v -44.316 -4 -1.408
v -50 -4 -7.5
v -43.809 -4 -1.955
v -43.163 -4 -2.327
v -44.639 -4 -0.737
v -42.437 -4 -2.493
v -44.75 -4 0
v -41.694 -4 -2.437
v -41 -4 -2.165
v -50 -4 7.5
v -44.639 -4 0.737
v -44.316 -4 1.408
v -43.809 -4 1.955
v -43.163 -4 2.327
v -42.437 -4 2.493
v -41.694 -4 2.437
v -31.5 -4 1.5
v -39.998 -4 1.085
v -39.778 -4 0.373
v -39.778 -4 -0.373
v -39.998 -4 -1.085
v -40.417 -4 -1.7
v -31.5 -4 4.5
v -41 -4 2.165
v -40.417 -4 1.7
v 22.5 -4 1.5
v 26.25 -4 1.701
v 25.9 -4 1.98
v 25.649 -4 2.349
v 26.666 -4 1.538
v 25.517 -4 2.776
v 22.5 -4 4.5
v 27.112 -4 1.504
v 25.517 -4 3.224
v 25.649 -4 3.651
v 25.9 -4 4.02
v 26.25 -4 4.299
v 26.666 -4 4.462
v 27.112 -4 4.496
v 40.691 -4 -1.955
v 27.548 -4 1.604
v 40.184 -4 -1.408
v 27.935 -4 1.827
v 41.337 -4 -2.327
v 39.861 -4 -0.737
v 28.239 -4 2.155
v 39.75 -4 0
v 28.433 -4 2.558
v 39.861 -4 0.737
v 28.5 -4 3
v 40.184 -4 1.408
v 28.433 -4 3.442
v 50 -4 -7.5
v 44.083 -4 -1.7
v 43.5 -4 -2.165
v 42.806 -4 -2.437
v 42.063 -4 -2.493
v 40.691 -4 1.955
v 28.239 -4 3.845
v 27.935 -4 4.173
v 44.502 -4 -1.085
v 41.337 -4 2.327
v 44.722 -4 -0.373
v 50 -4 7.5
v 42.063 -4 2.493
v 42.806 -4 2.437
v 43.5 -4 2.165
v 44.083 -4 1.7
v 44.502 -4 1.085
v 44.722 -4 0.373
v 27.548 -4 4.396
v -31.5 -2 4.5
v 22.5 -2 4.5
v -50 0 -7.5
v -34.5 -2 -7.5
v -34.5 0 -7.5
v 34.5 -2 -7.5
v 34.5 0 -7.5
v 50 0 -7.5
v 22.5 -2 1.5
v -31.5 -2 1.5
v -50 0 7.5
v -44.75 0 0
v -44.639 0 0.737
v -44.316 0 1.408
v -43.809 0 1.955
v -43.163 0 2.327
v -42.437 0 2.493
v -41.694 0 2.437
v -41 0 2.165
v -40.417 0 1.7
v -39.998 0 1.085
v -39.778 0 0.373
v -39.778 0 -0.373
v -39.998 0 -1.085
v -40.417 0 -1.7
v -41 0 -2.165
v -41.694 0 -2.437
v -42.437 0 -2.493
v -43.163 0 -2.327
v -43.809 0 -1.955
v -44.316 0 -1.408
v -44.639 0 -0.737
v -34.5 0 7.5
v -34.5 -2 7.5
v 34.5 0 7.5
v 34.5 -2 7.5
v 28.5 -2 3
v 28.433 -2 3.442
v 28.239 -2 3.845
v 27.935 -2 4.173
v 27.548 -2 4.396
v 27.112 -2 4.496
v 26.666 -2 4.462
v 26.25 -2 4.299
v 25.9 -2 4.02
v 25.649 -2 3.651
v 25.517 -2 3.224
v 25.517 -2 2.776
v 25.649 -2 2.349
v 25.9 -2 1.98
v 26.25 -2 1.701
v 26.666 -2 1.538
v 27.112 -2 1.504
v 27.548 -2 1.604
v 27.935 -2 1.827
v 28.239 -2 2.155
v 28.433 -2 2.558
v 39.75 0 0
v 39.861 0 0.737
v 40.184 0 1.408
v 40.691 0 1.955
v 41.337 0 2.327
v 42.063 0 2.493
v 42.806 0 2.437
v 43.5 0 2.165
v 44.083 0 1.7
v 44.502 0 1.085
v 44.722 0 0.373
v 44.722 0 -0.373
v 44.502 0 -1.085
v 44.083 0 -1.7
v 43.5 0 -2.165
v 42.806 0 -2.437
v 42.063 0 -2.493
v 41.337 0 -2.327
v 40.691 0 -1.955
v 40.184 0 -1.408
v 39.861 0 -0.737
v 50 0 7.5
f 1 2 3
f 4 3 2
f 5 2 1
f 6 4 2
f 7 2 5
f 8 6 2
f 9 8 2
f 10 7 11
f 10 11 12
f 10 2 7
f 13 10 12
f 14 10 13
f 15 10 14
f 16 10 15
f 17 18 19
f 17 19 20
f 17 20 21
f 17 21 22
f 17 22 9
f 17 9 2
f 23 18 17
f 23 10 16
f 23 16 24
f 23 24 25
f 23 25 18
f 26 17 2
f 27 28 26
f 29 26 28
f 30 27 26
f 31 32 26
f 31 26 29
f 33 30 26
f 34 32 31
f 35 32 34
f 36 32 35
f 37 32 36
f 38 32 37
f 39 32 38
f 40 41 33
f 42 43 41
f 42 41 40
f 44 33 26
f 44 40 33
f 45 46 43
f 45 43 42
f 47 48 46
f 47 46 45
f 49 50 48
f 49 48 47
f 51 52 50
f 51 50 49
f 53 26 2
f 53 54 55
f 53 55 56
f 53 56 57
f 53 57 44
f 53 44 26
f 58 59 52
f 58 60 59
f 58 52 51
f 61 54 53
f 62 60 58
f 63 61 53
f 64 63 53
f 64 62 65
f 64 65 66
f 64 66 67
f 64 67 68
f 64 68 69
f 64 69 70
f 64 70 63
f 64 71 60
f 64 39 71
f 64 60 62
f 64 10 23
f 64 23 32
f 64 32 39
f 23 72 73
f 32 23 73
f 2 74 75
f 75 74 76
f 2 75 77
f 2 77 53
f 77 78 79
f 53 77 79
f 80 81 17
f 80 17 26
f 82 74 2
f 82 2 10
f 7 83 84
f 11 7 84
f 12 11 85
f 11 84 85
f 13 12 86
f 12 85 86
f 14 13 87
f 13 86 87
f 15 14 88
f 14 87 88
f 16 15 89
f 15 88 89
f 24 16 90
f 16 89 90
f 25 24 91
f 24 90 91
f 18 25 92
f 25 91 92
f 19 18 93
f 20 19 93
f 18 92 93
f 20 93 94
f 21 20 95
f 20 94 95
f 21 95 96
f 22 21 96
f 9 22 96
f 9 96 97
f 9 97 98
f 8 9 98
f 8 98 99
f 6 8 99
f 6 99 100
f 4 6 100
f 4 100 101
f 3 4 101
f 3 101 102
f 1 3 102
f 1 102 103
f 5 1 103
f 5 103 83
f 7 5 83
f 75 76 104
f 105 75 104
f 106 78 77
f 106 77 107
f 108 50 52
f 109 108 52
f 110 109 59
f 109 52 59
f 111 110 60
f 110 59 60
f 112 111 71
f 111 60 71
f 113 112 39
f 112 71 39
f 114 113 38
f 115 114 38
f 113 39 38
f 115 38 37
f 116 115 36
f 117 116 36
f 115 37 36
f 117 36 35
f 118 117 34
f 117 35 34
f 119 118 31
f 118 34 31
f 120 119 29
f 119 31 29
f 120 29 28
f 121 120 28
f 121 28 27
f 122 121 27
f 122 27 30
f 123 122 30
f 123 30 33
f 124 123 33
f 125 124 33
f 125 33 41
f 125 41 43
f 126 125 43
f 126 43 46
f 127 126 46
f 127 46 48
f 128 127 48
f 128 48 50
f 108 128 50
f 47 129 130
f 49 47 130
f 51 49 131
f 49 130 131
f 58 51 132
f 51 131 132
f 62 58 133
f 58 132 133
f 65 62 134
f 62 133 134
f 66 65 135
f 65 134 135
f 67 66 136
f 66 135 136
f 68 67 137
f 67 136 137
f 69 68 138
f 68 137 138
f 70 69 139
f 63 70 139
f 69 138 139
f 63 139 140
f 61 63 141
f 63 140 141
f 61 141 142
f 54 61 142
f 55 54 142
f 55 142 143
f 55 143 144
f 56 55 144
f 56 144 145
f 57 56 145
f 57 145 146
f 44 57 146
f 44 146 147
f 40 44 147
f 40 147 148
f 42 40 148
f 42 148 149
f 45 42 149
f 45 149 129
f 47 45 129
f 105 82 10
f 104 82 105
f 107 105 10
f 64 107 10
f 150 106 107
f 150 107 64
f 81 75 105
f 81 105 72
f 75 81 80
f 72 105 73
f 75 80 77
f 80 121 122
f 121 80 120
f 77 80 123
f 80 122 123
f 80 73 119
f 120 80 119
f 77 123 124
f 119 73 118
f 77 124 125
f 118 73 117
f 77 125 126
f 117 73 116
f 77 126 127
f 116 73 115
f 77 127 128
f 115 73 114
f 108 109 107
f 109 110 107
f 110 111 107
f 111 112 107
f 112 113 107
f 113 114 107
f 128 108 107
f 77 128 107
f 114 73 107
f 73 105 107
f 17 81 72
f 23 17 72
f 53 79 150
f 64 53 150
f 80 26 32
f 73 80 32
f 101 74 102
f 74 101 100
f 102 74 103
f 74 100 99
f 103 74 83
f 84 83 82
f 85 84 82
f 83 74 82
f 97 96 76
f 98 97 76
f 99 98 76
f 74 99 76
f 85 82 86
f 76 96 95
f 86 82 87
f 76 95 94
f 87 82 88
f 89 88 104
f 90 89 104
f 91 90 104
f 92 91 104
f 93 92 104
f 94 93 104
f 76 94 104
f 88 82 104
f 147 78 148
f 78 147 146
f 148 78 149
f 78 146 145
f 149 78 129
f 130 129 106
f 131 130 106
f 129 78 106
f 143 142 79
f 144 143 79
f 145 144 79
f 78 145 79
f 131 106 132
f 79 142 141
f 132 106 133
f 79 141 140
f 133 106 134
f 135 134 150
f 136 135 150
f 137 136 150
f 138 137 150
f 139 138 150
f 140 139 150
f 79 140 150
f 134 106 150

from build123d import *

# Parameters (mm, degrees)
F0_W      = 100
F0_H      = 15
F0_W_2    = 63
F0_H_2    = 3
F1_DEPTH  = 4
F2_W      = 69
F2_H      = 15
F3_DEPTH  = 2
F4_R      = 2.5
F5_DEPTH  = 25
F6_R      = 2.5
F7_DEPTH  = 25
F8_W      = 9
F8_H      = 3
F9_DEPTH  = 2
F10_R     = 1.5
F11_DEPTH = 25
F12_W     = 68.882376
F12_H     = 7.5
F13_DEPTH = 2


with BuildPart() as f1:
    # F0 (on Front) → F1 (new body)
    with BuildSketch(Plane.XZ):
        Rectangle(F0_W, F0_H)
        with Locations((0, -3)):
            Rectangle(F0_W_2, F0_H_2, mode=Mode.SUBTRACT)
        with Locations((0, 3)):
            Rectangle(F0_W_2, F0_H_2, mode=Mode.SUBTRACT)
    extrude(amount=F1_DEPTH)

    # F2 (on face) → F3 (cut)
    with BuildSketch(Plane(origin=(0, 0, 0), x_dir=(-1, 0, 0), z_dir=(0, 1, 0))):
        Rectangle(F2_W, F2_H)
    extrude(amount=-F3_DEPTH, mode=Mode.SUBTRACT)

    # F4 (on face) → F5 (cut)
    with BuildSketch(Plane(origin=(0, 0, 0), x_dir=(-1, 0, 0), z_dir=(0, 1, 0))):
        with Locations((-42.25, 0)):
            Circle(F4_R)
    extrude(amount=-F5_DEPTH, mode=Mode.SUBTRACT)

    # F6 (on face) → F7 (cut)
    with BuildSketch(Plane(origin=(0, 0, 0), x_dir=(-1, 0, 0), z_dir=(0, 1, 0))):
        with Locations((42.25, 0)):
            Circle(F6_R)
    extrude(amount=-F7_DEPTH, mode=Mode.SUBTRACT)

    # F8 (on face) → F9 (join)
    with BuildSketch(Plane.XZ.offset(4)):
        with Locations((27, 3)):
            Rectangle(F8_W, F8_H)
    extrude(amount=-F9_DEPTH)

    # F10 (on face) → F11 (cut)
    with BuildSketch(Plane.XZ.offset(4)):
        with Locations((27, 3)):
            Circle(F10_R)
    extrude(amount=-F11_DEPTH, mode=Mode.SUBTRACT)

    # F12 (on face) → F13 (join)
    with BuildSketch(Plane.XZ.offset(4)):
        with Locations((0.509296, -3.75)):
            Rectangle(F12_W, F12_H)
    extrude(amount=-F13_DEPTH)


solid = f1.part
